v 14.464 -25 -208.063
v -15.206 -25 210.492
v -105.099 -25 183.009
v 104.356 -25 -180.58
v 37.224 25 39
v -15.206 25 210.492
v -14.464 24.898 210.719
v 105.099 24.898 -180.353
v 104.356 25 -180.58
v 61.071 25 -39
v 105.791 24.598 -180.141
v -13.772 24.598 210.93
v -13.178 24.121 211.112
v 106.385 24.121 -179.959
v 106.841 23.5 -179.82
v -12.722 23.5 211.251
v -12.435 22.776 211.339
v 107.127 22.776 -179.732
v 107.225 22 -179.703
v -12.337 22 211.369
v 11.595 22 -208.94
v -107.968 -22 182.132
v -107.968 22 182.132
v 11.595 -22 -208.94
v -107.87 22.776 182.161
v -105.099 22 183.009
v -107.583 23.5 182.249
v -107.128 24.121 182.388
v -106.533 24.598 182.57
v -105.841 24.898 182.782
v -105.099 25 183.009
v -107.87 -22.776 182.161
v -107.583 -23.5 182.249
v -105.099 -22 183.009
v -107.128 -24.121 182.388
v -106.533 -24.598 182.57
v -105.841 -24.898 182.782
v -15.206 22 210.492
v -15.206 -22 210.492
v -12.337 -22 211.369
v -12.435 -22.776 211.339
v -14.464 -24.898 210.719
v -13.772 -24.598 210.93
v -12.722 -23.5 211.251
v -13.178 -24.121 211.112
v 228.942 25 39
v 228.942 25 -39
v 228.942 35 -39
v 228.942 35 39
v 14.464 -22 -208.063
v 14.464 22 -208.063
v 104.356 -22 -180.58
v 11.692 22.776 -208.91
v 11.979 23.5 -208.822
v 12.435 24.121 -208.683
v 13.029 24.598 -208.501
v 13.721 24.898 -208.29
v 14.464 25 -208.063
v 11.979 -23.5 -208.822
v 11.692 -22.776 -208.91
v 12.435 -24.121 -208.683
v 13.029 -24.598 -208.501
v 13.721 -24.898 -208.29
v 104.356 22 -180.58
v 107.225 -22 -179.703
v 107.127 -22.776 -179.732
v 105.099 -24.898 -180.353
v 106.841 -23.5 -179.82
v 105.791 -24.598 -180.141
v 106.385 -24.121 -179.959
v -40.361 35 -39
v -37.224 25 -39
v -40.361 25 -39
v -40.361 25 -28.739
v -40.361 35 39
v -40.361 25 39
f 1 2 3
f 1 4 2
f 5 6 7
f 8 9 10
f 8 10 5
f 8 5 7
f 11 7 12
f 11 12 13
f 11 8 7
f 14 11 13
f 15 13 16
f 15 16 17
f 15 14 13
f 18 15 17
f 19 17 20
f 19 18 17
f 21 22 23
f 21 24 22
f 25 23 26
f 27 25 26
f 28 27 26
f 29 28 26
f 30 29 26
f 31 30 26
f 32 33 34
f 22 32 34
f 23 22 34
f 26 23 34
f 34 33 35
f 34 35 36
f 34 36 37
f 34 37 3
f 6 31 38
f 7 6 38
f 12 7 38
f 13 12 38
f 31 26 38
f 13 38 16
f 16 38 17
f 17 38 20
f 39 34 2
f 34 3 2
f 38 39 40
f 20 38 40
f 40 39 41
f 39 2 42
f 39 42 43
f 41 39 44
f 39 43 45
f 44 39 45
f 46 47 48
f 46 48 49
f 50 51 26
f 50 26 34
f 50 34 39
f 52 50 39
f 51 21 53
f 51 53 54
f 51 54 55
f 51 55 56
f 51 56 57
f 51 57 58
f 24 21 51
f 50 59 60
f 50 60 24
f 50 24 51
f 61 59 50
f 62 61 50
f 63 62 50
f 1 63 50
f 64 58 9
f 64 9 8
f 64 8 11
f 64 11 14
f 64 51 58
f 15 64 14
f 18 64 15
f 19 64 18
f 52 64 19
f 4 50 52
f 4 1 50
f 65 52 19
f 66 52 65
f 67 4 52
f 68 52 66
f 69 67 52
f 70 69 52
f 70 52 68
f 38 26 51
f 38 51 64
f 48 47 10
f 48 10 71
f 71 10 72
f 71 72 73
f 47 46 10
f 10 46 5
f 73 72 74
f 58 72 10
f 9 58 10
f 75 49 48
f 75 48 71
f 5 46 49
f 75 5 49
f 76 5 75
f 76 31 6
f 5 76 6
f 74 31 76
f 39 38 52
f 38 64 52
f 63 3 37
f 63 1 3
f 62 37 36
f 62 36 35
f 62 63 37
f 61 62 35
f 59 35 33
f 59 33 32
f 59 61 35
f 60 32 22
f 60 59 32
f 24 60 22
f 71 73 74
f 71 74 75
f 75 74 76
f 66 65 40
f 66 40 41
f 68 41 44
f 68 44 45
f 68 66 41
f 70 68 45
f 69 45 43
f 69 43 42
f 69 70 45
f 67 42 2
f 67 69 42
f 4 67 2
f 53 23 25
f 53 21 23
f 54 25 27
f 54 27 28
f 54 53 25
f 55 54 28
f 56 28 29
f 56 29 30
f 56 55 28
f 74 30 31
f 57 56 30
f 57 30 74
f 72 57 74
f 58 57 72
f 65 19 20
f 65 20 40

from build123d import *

# Parameters (mm, degrees)
F2_W          = 94
F2_H          = 44
F3_DEPTH      = 203.2
F3_DEPTH_BACK = 205.74
F4_W          = 269.302904
F4_H          = 78
F5_DEPTH      = 10


with BuildPart() as f3:
    # F2 (on face) → F3 (new body, two sides)
    with BuildSketch(Plane(origin=(0, 0, 0), x_dir=(0.956305, 0, 0.292372), z_dir=(0.292372, 0, -0.956305))) as f3_sk:
        with BuildLine():
            ThreePointArc((-50, -22), (-49.12132, -24.12132), (-47, -25))
            Line((-47, -25), (47, -25))
            ThreePointArc((47, -25), (49.12132, -24.12132), (50, -22))
            Line((50, -22), (50, 22))
            ThreePointArc((50, 22), (49.12132, 24.12132), (47, 25))
            Line((47, 25), (-47, 25))
            ThreePointArc((-47, 25), (-49.12132, 24.12132), (-50, 22))
            Line((-50, 22), (-50, -22))
        make_face()
        Rectangle(F2_W, F2_H, mode=Mode.SUBTRACT)
    extrude(amount=F3_DEPTH)
    extrude(f3_sk.sketch, amount=-F3_DEPTH_BACK)

    # F4 (on face) → F5 (join)
    with BuildSketch(Plane(origin=(0, 25, 0), x_dir=(-1, 0, 0), z_dir=(0, 1, 0))):
        with Locations((-94.290361, 0)):
            Rectangle(F4_W, F4_H)
    extrude(amount=F5_DEPTH)


solid = f3.part
